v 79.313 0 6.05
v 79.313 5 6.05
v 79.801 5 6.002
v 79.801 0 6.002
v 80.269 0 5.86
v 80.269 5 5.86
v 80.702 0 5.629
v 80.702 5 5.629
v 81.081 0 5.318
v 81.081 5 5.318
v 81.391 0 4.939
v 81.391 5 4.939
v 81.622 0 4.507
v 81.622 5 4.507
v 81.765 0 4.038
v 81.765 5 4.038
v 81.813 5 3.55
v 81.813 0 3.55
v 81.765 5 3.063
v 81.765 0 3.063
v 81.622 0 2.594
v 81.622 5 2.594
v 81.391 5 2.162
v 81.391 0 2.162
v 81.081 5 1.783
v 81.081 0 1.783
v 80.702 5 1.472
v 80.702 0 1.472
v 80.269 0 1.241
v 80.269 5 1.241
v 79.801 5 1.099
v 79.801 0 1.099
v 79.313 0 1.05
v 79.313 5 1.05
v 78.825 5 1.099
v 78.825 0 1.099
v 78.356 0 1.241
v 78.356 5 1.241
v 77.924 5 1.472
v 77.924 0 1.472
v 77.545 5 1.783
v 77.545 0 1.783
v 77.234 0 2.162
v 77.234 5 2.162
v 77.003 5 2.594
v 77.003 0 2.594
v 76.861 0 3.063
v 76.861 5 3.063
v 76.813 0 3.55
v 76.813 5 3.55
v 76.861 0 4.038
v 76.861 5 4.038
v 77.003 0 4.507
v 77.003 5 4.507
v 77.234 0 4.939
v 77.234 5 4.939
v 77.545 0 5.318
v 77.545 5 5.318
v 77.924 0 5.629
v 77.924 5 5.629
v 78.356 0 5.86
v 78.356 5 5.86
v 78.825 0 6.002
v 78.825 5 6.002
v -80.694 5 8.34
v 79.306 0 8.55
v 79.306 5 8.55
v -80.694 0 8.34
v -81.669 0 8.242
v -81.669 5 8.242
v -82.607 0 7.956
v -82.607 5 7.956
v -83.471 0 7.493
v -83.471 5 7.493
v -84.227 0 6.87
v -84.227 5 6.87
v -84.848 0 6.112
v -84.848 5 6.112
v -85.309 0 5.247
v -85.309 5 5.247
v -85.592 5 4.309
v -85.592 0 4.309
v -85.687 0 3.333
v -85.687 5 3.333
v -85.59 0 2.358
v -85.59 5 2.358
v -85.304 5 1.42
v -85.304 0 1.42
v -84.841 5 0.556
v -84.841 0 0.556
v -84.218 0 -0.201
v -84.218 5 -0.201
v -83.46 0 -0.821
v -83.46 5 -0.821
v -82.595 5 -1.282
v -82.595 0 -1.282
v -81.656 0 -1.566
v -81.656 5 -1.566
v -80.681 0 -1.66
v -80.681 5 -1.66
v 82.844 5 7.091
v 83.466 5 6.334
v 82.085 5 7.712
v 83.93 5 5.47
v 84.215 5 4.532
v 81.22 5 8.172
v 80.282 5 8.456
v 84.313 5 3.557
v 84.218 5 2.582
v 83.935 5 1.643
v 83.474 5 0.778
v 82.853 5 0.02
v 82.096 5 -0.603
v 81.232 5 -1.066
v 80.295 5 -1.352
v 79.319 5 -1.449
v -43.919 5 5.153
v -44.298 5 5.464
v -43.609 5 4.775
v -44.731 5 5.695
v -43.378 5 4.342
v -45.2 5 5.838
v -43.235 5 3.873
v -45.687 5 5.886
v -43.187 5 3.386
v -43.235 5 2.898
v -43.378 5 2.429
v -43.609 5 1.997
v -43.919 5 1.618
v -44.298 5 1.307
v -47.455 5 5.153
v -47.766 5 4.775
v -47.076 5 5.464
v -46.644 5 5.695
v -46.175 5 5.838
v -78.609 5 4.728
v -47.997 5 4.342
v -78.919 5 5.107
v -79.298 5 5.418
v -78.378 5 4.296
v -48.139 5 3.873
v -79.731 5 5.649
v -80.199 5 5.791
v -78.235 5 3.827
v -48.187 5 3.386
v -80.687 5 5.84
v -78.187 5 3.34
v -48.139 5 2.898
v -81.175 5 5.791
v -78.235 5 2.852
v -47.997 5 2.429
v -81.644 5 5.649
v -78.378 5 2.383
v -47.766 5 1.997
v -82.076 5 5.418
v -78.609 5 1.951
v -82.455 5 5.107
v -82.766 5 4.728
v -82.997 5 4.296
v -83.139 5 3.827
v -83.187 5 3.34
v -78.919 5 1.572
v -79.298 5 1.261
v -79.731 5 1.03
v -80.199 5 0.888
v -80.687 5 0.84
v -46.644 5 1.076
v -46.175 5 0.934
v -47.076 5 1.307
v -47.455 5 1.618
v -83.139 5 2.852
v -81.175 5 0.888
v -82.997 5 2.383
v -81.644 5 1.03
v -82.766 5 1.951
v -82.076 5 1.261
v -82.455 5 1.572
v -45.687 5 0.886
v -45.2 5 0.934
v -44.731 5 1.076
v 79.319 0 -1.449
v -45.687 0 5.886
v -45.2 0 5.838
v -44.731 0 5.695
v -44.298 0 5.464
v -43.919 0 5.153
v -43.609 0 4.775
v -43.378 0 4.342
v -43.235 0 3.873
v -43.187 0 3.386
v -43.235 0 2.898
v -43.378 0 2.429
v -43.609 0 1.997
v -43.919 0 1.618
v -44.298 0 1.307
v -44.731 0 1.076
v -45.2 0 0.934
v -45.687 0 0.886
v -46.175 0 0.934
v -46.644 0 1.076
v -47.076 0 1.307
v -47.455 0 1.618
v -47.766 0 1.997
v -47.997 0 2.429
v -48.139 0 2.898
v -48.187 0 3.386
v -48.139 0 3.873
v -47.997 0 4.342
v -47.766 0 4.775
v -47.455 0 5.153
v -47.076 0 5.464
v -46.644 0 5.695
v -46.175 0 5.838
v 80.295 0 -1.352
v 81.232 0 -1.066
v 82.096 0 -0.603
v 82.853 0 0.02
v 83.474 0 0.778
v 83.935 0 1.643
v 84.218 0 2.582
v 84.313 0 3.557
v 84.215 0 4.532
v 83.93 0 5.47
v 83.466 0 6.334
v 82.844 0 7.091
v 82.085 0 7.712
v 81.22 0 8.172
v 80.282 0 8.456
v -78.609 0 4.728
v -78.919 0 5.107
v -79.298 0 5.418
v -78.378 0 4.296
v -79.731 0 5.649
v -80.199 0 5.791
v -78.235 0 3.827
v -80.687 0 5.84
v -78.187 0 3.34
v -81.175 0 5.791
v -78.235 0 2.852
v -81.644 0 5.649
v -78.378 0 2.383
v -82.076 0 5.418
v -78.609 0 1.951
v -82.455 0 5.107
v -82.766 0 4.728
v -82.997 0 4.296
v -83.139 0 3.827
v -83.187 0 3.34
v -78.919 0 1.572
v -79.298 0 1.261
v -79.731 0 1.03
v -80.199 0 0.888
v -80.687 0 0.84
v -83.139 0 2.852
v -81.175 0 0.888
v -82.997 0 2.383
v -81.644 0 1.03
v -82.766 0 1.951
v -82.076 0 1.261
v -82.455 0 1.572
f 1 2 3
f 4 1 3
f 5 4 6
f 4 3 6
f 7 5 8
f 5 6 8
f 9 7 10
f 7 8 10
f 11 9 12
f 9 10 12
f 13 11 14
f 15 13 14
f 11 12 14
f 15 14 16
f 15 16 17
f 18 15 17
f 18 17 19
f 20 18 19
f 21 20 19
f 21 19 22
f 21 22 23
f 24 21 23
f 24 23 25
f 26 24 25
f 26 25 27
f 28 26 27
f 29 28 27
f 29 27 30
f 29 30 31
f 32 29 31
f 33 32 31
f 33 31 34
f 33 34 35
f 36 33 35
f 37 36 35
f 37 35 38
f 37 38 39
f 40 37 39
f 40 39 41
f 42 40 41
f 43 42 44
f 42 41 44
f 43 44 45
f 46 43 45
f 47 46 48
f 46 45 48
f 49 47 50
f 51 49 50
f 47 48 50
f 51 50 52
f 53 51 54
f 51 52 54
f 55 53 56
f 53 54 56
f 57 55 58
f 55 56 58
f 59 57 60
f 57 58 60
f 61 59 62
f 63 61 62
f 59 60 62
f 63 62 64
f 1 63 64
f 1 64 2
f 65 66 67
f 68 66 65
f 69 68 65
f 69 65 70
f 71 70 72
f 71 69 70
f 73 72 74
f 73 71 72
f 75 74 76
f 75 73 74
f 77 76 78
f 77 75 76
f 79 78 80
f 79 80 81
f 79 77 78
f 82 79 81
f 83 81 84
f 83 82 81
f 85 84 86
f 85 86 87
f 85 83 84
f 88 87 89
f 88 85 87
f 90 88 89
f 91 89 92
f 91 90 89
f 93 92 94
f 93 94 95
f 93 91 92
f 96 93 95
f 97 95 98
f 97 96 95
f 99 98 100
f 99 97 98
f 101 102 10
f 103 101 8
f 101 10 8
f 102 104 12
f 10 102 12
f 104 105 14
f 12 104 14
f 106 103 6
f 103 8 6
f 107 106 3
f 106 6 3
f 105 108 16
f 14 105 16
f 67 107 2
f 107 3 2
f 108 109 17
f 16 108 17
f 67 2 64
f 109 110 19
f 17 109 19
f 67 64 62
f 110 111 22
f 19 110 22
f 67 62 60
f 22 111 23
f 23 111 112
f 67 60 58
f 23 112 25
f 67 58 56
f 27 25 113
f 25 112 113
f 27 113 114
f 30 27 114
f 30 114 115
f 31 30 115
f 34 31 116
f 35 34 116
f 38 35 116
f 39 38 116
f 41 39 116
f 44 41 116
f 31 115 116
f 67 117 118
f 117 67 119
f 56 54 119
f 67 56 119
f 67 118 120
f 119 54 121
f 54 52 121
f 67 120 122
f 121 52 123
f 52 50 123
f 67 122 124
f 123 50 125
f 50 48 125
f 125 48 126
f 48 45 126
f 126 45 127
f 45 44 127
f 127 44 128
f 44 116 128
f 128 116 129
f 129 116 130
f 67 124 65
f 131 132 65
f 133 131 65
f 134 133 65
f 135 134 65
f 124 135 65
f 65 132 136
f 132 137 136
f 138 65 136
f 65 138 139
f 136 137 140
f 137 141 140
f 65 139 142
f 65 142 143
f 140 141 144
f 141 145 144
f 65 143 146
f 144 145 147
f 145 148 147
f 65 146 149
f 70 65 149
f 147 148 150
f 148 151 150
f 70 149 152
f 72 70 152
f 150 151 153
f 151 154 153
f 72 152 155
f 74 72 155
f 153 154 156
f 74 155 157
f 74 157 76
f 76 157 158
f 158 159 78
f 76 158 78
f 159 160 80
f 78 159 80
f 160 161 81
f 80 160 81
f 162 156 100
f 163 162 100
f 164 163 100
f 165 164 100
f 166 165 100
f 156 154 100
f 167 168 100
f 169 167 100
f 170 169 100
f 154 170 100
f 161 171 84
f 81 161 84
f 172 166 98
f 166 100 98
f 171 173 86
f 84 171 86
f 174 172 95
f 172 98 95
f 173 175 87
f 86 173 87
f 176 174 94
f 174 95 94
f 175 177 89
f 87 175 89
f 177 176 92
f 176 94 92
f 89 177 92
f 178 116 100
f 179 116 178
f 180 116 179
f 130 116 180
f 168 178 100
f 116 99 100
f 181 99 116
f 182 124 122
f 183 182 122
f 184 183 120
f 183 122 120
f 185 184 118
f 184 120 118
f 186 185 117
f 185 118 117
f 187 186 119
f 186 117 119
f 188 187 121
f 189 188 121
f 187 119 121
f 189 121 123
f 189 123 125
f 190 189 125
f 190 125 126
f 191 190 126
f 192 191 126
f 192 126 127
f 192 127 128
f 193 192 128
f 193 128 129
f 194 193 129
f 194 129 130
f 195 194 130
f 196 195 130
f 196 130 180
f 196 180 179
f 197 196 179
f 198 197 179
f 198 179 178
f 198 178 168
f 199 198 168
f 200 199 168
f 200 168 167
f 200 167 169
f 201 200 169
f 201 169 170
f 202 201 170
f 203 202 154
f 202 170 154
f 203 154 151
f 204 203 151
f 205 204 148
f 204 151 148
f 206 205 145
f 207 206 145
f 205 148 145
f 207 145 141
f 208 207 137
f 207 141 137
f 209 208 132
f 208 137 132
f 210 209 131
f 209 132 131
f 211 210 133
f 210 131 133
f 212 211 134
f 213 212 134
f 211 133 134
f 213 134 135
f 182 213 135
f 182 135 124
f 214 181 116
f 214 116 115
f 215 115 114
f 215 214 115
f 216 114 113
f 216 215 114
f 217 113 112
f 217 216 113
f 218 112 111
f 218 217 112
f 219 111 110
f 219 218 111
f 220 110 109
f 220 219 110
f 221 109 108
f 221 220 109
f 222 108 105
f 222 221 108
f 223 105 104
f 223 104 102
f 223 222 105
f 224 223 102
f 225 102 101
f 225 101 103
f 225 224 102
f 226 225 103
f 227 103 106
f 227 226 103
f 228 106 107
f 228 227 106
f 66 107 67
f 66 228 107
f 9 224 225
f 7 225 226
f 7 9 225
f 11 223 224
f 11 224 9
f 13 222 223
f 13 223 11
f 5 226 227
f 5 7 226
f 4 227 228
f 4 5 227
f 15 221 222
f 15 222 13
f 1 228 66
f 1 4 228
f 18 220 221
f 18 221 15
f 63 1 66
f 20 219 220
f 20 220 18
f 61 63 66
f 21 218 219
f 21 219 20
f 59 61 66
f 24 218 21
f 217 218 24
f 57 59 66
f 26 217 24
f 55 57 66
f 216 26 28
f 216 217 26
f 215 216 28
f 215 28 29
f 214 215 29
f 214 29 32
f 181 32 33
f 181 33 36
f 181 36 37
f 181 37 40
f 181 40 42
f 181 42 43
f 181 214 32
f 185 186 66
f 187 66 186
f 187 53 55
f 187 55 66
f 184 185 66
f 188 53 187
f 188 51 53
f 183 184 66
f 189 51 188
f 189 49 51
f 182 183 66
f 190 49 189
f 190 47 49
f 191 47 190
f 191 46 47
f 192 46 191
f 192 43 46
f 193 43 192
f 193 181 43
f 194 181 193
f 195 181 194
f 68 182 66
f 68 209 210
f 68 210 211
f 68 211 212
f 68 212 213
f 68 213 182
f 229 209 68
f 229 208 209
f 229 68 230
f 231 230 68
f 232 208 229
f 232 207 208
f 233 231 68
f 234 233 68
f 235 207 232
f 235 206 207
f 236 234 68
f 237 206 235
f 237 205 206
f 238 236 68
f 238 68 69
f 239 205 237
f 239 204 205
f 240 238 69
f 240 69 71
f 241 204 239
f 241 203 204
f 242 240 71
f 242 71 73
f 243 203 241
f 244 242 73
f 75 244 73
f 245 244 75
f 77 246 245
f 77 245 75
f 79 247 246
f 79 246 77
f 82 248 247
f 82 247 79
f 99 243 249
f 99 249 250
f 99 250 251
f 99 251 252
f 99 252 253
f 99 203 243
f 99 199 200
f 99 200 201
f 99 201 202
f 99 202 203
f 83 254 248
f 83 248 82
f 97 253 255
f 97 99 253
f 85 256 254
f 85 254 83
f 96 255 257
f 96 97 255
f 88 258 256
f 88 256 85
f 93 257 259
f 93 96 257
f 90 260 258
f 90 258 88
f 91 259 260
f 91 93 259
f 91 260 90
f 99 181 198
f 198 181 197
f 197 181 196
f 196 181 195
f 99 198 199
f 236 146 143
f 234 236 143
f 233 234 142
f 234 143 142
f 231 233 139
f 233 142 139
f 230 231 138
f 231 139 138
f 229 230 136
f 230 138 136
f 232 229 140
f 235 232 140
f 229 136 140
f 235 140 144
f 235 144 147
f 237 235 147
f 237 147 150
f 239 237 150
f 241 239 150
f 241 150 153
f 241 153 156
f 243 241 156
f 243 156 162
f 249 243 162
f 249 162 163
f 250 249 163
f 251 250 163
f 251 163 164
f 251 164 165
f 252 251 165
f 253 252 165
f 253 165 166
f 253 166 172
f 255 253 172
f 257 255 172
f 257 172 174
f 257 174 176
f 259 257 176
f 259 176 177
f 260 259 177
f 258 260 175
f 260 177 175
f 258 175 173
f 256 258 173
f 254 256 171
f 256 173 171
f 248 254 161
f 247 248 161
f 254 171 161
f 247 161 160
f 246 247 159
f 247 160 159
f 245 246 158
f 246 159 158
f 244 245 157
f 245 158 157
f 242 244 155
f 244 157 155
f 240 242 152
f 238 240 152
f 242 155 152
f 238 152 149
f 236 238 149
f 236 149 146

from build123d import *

# Parameters (mm, degrees)
BOSS_EXTRUDE1_DEPTH = 5
CUT_EXTRUDE1_REACH  = 88.258
SKETCH3_R           = 2.5


with BuildPart() as part:
    # Sketch2 → Boss-Extrude1 (new body)
    with BuildSketch(Plane(origin=(0, 0, 0), x_dir=(1, 0, 0), z_dir=(0, 1, 0))):
        with BuildLine():
            Line((-80.680626491, 1.660466244), (79.319373509, 1.44949578))
            ThreePointArc((79.319373509, 1.44949578), (84.312776341, -3.557092695), (79.306187867, -8.550495527))
            Line((79.306187867, -8.550495527), (-80.693812133, -8.339525063))
            ThreePointArc((-80.693812133, -8.339525063), (-85.687214966, -3.332936588), (-80.680626491, 1.660466244))
        make_face()
    extrude(amount=BOSS_EXTRUDE1_DEPTH)

    # Sketch3 → Cut-Extrude1 (cut, up to next)
    with BuildSketch(Plane(origin=(0, 5, 0), x_dir=(1, 0, 0), z_dir=(0, 1, 0)), mode=Mode.PRIVATE) as cut_extrude1_sk1:
        with Locations(Location((-80.687219312, -3.33952941, 0), (0, 0, 270))):
            Circle(SKETCH3_R)
    cut_extrude1_tool1 = extrude(cut_extrude1_sk1.sketch, amount=-CUT_EXTRUDE1_REACH, mode=Mode.PRIVATE) & part.part
    # Sketch3 → Cut-Extrude1 (cut, up to next)
    with BuildSketch(Plane(origin=(0, 5, 0), x_dir=(1, 0, 0), z_dir=(0, 1, 0)), mode=Mode.PRIVATE) as cut_extrude1_sk2:
        with Locations(Location((79.312780688, -3.550499874, 0), (0, 0, 270))):
            Circle(SKETCH3_R)
    cut_extrude1_tool2 = extrude(cut_extrude1_sk2.sketch, amount=-CUT_EXTRUDE1_REACH, mode=Mode.PRIVATE) & part.part
    # Sketch3 → Cut-Extrude1 (cut, up to next)
    with BuildSketch(Plane(origin=(0, 5, 0), x_dir=(1, 0, 0), z_dir=(0, 1, 0)), mode=Mode.PRIVATE) as cut_extrude1_sk3:
        with Locations(Location((-45.687249738, -3.385679158, 0), (0, 0, 270))):
            Circle(SKETCH3_R)
    cut_extrude1_tool3 = extrude(cut_extrude1_sk3.sketch, amount=-CUT_EXTRUDE1_REACH, mode=Mode.PRIVATE) & part.part
    add(cut_extrude1_tool1.solids().sort_by_distance((-80.687219, 5, 3.339529))[0], mode=Mode.SUBTRACT)
    add(cut_extrude1_tool2.solids().sort_by_distance((79.312781, 5, 3.5505))[0], mode=Mode.SUBTRACT)
    add(cut_extrude1_tool3.solids().sort_by_distance((-45.68725, 5, 3.385679))[0], mode=Mode.SUBTRACT)


solid = part.part
